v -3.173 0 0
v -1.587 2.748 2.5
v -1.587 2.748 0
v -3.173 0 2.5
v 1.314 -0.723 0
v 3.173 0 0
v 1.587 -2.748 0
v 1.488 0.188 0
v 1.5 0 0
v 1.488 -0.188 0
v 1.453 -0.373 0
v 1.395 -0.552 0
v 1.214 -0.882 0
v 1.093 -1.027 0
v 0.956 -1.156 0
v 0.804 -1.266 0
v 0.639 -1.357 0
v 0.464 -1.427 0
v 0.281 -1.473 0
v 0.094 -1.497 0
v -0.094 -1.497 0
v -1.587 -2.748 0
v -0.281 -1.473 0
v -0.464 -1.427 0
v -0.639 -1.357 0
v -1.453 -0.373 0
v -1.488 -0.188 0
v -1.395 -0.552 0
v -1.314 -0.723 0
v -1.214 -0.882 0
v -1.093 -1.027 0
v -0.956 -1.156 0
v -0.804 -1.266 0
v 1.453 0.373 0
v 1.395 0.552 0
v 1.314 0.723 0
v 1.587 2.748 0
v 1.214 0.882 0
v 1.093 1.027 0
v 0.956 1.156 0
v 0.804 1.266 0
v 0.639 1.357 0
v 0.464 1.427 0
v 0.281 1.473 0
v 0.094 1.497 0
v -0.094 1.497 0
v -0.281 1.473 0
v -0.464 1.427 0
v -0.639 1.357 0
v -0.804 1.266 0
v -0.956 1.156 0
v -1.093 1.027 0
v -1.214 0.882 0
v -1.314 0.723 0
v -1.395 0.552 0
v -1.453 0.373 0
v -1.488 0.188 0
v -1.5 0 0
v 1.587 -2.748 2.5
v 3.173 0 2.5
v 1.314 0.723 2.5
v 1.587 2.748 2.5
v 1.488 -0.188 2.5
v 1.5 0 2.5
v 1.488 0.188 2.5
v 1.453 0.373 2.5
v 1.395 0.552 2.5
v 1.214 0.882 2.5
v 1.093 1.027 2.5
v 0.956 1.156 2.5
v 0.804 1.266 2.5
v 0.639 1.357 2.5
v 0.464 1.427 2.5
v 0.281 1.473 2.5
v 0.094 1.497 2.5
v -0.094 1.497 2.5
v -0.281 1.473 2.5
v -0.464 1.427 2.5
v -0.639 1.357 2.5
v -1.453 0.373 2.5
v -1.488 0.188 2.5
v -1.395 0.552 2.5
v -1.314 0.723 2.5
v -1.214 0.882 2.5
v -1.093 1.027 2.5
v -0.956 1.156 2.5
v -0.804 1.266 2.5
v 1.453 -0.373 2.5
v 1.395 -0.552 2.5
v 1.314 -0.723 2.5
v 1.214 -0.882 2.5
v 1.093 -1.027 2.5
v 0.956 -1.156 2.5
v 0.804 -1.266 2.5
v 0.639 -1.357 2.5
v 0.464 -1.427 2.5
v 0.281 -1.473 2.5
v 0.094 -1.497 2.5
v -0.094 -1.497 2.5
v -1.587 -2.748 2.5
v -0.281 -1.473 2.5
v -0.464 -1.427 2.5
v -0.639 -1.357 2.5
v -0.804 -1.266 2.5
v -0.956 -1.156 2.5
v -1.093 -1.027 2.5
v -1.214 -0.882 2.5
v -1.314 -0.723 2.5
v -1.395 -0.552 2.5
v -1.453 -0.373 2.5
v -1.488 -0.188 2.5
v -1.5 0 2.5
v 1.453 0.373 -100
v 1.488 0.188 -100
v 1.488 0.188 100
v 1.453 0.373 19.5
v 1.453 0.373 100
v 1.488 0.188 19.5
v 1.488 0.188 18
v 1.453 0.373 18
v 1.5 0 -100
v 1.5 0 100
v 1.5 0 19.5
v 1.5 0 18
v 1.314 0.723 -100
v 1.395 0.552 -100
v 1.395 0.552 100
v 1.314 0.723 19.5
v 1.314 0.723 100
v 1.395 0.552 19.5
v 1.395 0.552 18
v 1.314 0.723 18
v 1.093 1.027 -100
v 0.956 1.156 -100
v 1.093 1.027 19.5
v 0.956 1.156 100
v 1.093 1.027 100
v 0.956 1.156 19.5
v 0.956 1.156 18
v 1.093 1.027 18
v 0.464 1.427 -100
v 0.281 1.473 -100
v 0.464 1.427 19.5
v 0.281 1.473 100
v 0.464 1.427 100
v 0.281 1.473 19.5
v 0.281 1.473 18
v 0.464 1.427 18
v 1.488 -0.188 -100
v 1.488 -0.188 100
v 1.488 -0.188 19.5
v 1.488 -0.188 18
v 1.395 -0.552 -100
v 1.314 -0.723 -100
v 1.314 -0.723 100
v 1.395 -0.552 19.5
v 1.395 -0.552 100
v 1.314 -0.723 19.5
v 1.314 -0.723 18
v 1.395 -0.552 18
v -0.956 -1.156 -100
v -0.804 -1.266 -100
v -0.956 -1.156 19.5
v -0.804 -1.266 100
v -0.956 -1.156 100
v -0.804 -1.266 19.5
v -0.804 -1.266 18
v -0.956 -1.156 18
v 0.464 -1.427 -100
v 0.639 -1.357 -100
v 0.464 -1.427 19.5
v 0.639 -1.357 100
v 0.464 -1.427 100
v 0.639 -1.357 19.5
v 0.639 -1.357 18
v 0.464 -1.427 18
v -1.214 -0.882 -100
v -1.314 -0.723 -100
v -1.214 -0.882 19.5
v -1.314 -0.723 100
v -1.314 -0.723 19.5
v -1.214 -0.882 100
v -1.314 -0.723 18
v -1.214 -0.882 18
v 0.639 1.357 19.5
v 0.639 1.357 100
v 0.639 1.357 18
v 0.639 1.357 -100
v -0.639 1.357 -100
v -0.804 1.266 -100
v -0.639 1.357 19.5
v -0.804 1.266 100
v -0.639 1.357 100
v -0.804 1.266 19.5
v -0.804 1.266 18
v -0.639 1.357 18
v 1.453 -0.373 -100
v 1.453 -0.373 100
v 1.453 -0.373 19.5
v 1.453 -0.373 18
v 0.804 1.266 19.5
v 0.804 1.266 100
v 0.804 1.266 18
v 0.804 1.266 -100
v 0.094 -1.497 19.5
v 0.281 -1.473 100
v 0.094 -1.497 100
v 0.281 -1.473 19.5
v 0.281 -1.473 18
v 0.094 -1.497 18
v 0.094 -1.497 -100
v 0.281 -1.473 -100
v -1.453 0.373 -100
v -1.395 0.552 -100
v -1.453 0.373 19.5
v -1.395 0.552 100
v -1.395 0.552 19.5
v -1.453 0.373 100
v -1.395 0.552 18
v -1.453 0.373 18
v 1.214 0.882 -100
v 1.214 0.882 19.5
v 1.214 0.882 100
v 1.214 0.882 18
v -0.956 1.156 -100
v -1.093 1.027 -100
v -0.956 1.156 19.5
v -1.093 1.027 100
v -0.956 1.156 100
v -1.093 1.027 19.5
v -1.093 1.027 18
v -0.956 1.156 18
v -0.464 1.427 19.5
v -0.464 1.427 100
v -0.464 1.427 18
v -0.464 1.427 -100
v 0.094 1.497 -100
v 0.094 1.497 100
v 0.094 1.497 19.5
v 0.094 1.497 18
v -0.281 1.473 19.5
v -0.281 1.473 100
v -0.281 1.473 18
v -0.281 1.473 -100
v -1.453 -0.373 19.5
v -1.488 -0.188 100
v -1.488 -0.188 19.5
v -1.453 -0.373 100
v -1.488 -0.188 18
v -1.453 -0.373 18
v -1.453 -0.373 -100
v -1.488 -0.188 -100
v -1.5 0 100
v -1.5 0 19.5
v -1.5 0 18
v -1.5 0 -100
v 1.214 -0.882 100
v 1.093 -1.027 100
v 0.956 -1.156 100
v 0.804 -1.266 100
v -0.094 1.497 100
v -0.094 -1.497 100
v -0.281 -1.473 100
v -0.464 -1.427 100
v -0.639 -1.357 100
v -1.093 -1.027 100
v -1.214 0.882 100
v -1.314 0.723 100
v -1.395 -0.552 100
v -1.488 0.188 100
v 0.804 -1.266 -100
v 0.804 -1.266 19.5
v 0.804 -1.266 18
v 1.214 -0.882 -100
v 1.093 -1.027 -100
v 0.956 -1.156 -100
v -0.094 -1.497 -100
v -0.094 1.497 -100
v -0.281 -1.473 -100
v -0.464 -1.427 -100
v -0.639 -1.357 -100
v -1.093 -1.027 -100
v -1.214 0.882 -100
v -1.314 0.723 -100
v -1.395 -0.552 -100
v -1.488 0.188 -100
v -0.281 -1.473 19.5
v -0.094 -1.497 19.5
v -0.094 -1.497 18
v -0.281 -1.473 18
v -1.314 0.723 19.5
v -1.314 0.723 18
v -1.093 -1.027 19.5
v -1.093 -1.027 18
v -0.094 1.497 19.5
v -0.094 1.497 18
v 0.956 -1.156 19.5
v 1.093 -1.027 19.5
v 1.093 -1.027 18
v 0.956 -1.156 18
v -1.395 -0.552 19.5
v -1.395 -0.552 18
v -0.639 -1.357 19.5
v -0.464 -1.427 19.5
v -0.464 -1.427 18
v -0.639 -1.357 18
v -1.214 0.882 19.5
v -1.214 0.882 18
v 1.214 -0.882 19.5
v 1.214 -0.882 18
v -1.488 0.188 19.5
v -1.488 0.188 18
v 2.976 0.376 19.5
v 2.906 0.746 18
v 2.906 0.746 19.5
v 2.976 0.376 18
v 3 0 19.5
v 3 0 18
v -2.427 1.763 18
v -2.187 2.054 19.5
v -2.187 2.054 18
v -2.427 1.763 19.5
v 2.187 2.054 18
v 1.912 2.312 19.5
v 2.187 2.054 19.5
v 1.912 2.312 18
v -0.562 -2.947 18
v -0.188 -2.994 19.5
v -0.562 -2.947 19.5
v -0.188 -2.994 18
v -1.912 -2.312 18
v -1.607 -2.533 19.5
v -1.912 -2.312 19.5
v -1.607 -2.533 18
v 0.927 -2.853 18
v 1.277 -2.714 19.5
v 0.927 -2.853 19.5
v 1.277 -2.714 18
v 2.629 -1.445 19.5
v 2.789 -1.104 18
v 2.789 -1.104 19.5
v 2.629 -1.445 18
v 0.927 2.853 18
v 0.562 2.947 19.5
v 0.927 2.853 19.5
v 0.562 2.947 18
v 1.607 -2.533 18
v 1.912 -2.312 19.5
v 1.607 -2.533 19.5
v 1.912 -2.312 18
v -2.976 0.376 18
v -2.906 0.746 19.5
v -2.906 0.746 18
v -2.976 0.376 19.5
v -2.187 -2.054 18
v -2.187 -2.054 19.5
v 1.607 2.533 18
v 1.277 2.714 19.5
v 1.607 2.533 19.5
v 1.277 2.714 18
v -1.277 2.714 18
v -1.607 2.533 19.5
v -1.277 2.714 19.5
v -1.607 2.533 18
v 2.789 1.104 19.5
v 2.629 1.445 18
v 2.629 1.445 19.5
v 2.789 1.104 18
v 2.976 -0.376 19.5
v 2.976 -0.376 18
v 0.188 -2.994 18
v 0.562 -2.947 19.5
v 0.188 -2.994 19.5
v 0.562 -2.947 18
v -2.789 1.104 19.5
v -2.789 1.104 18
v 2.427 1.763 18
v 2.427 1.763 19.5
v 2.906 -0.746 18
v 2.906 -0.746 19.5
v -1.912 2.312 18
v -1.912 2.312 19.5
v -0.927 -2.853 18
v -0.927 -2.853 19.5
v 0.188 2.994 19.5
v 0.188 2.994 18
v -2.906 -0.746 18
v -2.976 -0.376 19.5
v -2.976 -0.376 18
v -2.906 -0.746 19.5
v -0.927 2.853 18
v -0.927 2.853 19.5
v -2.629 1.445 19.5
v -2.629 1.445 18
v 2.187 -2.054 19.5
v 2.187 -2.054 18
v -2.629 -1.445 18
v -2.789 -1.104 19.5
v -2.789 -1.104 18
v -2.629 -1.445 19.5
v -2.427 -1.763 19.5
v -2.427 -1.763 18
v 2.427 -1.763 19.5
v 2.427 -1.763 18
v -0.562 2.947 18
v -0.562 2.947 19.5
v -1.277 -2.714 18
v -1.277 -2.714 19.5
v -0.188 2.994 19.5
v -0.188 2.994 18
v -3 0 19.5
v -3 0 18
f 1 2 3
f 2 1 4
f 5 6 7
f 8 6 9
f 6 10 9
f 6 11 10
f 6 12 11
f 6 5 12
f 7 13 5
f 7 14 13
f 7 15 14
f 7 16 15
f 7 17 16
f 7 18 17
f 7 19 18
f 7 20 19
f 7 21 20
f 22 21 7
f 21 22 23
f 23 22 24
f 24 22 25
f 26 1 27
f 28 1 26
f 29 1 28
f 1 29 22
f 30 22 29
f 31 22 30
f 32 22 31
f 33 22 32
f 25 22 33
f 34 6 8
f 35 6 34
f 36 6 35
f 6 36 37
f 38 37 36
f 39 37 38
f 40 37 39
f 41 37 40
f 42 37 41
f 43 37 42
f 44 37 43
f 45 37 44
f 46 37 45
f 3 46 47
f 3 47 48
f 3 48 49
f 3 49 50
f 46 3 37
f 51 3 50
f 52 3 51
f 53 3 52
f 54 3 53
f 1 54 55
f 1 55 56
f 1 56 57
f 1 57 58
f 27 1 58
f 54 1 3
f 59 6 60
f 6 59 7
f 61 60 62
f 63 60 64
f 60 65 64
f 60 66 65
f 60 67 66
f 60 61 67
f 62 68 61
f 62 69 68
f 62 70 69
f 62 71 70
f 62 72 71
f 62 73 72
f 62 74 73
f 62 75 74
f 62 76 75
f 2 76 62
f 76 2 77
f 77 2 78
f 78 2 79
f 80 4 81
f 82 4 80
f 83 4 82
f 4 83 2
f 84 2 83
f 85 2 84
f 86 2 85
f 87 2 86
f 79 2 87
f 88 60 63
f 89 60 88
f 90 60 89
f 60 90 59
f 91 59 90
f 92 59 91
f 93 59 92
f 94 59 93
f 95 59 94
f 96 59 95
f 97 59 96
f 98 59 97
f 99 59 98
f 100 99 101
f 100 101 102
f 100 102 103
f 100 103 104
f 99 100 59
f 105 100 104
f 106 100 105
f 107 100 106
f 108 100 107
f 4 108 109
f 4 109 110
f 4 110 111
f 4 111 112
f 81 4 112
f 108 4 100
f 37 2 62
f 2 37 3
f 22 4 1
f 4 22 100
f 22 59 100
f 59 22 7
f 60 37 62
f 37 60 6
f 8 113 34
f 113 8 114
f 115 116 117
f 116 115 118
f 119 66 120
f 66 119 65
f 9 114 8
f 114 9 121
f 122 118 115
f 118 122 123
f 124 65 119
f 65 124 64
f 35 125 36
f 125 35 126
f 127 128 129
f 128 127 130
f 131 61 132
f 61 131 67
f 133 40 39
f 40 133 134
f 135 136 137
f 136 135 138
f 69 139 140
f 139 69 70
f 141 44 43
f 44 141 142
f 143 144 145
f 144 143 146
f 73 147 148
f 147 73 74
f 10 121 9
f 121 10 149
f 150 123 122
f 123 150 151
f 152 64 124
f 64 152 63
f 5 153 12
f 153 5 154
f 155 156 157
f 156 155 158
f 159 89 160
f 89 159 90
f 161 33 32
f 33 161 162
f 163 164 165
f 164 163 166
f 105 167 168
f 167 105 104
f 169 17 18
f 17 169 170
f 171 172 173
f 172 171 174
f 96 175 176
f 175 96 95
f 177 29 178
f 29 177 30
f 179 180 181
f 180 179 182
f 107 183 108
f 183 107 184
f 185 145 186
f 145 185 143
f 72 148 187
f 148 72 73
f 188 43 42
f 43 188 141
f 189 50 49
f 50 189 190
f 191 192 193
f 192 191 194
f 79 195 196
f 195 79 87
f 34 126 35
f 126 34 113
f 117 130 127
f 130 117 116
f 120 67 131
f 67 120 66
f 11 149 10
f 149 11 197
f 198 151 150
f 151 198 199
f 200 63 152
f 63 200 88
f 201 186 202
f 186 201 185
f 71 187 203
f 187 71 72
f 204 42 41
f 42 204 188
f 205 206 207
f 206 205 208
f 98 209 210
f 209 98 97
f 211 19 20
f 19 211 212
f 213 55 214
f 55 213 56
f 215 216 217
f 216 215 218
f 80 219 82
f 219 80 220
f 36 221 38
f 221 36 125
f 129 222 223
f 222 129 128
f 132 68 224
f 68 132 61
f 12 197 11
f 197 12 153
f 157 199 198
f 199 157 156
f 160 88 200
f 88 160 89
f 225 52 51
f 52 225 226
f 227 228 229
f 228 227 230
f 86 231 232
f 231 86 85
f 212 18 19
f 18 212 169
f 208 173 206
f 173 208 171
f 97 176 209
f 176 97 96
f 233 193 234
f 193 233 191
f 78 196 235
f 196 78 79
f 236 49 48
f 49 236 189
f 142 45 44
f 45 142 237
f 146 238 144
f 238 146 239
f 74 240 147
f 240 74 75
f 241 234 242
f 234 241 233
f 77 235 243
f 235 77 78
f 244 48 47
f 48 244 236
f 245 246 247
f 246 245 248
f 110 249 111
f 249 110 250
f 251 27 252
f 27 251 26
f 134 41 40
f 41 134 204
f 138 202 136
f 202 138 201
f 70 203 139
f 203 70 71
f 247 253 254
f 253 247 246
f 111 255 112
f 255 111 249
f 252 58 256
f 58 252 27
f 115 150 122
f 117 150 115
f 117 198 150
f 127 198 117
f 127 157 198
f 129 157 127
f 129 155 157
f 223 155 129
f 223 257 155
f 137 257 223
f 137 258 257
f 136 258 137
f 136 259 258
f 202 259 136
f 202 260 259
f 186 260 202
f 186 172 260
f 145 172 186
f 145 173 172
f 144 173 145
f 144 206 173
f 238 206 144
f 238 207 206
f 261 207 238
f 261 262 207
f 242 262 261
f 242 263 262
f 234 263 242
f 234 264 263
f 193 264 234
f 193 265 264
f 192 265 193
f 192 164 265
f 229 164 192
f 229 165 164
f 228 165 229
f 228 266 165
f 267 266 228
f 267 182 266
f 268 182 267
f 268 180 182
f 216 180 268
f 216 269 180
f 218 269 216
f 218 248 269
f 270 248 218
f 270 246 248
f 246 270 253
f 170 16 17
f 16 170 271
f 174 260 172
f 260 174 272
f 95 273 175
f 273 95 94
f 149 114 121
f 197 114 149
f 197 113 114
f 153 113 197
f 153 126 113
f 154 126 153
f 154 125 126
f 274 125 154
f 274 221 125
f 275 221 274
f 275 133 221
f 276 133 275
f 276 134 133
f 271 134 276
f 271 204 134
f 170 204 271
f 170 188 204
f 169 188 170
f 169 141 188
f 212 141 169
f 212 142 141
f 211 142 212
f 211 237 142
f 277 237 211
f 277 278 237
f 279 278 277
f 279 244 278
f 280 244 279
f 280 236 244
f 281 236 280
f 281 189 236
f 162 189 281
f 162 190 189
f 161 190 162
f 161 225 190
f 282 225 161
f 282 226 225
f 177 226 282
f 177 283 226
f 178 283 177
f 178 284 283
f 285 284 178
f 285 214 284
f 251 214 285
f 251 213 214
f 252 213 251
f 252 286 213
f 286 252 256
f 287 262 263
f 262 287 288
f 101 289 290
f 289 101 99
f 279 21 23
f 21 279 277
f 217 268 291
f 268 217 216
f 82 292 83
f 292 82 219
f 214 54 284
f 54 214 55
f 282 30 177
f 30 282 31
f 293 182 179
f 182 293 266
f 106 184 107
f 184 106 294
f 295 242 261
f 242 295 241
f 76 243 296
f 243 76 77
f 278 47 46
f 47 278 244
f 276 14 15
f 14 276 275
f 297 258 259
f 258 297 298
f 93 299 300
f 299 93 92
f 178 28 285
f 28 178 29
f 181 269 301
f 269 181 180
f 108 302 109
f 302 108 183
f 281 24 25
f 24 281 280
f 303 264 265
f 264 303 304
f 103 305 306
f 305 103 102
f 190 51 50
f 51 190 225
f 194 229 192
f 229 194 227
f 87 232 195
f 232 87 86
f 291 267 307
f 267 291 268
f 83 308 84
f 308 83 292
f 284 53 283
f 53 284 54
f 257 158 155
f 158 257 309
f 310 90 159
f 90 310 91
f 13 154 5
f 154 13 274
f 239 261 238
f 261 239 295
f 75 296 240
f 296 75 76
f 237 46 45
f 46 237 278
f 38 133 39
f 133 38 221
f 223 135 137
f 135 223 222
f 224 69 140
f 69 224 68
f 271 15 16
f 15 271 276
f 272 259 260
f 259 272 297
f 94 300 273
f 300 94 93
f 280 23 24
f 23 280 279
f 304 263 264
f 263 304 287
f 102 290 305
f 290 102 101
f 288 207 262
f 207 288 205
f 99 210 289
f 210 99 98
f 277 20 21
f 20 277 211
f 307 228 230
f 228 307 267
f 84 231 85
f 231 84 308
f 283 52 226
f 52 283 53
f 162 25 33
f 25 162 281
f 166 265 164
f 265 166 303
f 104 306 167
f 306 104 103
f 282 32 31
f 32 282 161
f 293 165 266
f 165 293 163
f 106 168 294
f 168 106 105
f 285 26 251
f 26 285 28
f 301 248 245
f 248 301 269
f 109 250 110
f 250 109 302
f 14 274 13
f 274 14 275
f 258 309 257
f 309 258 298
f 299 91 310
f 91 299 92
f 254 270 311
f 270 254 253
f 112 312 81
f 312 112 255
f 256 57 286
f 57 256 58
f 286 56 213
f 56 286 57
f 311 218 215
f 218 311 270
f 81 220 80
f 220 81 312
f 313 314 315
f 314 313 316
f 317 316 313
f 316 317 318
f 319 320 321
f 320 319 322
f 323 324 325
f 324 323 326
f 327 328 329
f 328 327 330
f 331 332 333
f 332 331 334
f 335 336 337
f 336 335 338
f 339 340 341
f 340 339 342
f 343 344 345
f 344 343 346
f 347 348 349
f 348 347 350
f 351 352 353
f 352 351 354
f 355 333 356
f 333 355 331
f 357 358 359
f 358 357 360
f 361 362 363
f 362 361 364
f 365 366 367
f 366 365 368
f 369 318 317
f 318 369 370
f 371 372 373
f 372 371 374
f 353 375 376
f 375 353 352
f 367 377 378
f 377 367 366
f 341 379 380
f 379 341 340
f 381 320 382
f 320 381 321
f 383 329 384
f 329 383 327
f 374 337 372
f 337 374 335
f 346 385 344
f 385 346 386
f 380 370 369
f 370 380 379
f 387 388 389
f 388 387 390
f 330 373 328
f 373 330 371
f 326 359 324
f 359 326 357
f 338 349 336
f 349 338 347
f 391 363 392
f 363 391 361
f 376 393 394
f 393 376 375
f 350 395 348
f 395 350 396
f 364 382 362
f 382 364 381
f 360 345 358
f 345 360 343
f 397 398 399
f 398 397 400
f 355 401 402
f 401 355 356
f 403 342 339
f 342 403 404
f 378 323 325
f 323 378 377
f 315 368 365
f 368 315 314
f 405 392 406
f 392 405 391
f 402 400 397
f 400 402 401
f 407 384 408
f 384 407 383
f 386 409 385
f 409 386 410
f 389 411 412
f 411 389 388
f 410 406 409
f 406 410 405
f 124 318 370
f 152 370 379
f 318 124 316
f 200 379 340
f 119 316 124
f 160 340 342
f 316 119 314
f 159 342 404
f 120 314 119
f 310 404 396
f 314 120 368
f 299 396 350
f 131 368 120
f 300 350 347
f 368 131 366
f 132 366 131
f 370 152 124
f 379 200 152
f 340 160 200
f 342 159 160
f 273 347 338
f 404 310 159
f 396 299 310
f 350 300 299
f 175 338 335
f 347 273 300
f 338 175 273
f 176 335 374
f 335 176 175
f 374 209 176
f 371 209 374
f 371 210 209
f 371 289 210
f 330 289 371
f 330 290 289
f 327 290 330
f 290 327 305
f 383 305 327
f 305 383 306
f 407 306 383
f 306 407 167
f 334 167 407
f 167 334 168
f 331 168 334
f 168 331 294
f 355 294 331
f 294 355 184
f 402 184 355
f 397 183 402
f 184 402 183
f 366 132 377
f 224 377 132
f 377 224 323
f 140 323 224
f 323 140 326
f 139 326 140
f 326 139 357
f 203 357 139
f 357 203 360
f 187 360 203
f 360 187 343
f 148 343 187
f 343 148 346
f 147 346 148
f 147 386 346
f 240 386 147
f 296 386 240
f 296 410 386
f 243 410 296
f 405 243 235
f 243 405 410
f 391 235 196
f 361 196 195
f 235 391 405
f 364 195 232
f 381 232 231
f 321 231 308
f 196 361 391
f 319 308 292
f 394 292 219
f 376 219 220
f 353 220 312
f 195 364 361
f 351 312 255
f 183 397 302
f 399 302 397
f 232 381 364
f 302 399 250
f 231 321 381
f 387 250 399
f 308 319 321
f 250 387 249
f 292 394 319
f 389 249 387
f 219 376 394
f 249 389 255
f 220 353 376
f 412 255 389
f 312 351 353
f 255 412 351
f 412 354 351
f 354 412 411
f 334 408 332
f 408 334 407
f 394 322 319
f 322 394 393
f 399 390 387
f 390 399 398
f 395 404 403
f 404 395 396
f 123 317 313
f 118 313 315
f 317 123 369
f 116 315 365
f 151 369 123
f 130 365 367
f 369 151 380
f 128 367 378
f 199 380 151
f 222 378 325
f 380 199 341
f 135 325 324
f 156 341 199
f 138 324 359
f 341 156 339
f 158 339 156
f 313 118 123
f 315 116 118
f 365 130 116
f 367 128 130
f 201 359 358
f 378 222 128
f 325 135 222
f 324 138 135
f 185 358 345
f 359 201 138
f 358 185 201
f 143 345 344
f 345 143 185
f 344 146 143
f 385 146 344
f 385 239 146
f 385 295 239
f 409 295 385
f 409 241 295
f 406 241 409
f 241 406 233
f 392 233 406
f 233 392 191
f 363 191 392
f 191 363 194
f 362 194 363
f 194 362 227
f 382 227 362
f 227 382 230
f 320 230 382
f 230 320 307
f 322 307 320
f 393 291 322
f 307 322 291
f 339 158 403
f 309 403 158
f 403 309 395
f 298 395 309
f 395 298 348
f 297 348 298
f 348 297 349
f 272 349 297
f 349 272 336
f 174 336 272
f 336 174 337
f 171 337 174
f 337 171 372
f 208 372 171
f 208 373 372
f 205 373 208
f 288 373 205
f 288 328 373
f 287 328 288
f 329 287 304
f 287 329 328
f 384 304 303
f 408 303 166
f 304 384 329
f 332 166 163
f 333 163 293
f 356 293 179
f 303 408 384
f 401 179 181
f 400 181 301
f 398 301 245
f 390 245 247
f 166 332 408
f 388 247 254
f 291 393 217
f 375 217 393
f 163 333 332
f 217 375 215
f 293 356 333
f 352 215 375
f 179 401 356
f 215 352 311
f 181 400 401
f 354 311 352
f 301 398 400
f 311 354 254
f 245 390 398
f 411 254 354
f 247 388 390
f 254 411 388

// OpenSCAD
$fn = 50;

difference() {
	union() {
		translate(v = [0, 0, 0]) {
			rotate(a = [0, 0, 0]) {
				difference() {
					union() {
						translate(v = [0, 0, 0.0]) {
							rotate(a = [0, 0, 0]) {
								difference() {
									union() {
										linear_extrude(height = 2.5) {
											polygon(points = [[3.1734999999999998, 0.0], [1.5867500000000003, 2.7483316189099156], [-1.5867499999999992, 2.748331618909916], [-3.1734999999999998, 3.886416617094125e-16], [-1.5867500000000012, -2.748331618909915], [1.5867499999999977, -2.748331618909917]]);
										}
										translate(v = [0, 0, -100.0]) {
											cylinder(h = 200, r = 1.5);
										}
									}
									union();
								}
							}
						}
						translate(v = [0, 0, 18.0]) {
							cylinder(h = 1.5, r = 3.0);
						}
						cylinder(h = 18, r = 1.25);
					}
					union();
				}
			}
		}
	}
	union();
}
